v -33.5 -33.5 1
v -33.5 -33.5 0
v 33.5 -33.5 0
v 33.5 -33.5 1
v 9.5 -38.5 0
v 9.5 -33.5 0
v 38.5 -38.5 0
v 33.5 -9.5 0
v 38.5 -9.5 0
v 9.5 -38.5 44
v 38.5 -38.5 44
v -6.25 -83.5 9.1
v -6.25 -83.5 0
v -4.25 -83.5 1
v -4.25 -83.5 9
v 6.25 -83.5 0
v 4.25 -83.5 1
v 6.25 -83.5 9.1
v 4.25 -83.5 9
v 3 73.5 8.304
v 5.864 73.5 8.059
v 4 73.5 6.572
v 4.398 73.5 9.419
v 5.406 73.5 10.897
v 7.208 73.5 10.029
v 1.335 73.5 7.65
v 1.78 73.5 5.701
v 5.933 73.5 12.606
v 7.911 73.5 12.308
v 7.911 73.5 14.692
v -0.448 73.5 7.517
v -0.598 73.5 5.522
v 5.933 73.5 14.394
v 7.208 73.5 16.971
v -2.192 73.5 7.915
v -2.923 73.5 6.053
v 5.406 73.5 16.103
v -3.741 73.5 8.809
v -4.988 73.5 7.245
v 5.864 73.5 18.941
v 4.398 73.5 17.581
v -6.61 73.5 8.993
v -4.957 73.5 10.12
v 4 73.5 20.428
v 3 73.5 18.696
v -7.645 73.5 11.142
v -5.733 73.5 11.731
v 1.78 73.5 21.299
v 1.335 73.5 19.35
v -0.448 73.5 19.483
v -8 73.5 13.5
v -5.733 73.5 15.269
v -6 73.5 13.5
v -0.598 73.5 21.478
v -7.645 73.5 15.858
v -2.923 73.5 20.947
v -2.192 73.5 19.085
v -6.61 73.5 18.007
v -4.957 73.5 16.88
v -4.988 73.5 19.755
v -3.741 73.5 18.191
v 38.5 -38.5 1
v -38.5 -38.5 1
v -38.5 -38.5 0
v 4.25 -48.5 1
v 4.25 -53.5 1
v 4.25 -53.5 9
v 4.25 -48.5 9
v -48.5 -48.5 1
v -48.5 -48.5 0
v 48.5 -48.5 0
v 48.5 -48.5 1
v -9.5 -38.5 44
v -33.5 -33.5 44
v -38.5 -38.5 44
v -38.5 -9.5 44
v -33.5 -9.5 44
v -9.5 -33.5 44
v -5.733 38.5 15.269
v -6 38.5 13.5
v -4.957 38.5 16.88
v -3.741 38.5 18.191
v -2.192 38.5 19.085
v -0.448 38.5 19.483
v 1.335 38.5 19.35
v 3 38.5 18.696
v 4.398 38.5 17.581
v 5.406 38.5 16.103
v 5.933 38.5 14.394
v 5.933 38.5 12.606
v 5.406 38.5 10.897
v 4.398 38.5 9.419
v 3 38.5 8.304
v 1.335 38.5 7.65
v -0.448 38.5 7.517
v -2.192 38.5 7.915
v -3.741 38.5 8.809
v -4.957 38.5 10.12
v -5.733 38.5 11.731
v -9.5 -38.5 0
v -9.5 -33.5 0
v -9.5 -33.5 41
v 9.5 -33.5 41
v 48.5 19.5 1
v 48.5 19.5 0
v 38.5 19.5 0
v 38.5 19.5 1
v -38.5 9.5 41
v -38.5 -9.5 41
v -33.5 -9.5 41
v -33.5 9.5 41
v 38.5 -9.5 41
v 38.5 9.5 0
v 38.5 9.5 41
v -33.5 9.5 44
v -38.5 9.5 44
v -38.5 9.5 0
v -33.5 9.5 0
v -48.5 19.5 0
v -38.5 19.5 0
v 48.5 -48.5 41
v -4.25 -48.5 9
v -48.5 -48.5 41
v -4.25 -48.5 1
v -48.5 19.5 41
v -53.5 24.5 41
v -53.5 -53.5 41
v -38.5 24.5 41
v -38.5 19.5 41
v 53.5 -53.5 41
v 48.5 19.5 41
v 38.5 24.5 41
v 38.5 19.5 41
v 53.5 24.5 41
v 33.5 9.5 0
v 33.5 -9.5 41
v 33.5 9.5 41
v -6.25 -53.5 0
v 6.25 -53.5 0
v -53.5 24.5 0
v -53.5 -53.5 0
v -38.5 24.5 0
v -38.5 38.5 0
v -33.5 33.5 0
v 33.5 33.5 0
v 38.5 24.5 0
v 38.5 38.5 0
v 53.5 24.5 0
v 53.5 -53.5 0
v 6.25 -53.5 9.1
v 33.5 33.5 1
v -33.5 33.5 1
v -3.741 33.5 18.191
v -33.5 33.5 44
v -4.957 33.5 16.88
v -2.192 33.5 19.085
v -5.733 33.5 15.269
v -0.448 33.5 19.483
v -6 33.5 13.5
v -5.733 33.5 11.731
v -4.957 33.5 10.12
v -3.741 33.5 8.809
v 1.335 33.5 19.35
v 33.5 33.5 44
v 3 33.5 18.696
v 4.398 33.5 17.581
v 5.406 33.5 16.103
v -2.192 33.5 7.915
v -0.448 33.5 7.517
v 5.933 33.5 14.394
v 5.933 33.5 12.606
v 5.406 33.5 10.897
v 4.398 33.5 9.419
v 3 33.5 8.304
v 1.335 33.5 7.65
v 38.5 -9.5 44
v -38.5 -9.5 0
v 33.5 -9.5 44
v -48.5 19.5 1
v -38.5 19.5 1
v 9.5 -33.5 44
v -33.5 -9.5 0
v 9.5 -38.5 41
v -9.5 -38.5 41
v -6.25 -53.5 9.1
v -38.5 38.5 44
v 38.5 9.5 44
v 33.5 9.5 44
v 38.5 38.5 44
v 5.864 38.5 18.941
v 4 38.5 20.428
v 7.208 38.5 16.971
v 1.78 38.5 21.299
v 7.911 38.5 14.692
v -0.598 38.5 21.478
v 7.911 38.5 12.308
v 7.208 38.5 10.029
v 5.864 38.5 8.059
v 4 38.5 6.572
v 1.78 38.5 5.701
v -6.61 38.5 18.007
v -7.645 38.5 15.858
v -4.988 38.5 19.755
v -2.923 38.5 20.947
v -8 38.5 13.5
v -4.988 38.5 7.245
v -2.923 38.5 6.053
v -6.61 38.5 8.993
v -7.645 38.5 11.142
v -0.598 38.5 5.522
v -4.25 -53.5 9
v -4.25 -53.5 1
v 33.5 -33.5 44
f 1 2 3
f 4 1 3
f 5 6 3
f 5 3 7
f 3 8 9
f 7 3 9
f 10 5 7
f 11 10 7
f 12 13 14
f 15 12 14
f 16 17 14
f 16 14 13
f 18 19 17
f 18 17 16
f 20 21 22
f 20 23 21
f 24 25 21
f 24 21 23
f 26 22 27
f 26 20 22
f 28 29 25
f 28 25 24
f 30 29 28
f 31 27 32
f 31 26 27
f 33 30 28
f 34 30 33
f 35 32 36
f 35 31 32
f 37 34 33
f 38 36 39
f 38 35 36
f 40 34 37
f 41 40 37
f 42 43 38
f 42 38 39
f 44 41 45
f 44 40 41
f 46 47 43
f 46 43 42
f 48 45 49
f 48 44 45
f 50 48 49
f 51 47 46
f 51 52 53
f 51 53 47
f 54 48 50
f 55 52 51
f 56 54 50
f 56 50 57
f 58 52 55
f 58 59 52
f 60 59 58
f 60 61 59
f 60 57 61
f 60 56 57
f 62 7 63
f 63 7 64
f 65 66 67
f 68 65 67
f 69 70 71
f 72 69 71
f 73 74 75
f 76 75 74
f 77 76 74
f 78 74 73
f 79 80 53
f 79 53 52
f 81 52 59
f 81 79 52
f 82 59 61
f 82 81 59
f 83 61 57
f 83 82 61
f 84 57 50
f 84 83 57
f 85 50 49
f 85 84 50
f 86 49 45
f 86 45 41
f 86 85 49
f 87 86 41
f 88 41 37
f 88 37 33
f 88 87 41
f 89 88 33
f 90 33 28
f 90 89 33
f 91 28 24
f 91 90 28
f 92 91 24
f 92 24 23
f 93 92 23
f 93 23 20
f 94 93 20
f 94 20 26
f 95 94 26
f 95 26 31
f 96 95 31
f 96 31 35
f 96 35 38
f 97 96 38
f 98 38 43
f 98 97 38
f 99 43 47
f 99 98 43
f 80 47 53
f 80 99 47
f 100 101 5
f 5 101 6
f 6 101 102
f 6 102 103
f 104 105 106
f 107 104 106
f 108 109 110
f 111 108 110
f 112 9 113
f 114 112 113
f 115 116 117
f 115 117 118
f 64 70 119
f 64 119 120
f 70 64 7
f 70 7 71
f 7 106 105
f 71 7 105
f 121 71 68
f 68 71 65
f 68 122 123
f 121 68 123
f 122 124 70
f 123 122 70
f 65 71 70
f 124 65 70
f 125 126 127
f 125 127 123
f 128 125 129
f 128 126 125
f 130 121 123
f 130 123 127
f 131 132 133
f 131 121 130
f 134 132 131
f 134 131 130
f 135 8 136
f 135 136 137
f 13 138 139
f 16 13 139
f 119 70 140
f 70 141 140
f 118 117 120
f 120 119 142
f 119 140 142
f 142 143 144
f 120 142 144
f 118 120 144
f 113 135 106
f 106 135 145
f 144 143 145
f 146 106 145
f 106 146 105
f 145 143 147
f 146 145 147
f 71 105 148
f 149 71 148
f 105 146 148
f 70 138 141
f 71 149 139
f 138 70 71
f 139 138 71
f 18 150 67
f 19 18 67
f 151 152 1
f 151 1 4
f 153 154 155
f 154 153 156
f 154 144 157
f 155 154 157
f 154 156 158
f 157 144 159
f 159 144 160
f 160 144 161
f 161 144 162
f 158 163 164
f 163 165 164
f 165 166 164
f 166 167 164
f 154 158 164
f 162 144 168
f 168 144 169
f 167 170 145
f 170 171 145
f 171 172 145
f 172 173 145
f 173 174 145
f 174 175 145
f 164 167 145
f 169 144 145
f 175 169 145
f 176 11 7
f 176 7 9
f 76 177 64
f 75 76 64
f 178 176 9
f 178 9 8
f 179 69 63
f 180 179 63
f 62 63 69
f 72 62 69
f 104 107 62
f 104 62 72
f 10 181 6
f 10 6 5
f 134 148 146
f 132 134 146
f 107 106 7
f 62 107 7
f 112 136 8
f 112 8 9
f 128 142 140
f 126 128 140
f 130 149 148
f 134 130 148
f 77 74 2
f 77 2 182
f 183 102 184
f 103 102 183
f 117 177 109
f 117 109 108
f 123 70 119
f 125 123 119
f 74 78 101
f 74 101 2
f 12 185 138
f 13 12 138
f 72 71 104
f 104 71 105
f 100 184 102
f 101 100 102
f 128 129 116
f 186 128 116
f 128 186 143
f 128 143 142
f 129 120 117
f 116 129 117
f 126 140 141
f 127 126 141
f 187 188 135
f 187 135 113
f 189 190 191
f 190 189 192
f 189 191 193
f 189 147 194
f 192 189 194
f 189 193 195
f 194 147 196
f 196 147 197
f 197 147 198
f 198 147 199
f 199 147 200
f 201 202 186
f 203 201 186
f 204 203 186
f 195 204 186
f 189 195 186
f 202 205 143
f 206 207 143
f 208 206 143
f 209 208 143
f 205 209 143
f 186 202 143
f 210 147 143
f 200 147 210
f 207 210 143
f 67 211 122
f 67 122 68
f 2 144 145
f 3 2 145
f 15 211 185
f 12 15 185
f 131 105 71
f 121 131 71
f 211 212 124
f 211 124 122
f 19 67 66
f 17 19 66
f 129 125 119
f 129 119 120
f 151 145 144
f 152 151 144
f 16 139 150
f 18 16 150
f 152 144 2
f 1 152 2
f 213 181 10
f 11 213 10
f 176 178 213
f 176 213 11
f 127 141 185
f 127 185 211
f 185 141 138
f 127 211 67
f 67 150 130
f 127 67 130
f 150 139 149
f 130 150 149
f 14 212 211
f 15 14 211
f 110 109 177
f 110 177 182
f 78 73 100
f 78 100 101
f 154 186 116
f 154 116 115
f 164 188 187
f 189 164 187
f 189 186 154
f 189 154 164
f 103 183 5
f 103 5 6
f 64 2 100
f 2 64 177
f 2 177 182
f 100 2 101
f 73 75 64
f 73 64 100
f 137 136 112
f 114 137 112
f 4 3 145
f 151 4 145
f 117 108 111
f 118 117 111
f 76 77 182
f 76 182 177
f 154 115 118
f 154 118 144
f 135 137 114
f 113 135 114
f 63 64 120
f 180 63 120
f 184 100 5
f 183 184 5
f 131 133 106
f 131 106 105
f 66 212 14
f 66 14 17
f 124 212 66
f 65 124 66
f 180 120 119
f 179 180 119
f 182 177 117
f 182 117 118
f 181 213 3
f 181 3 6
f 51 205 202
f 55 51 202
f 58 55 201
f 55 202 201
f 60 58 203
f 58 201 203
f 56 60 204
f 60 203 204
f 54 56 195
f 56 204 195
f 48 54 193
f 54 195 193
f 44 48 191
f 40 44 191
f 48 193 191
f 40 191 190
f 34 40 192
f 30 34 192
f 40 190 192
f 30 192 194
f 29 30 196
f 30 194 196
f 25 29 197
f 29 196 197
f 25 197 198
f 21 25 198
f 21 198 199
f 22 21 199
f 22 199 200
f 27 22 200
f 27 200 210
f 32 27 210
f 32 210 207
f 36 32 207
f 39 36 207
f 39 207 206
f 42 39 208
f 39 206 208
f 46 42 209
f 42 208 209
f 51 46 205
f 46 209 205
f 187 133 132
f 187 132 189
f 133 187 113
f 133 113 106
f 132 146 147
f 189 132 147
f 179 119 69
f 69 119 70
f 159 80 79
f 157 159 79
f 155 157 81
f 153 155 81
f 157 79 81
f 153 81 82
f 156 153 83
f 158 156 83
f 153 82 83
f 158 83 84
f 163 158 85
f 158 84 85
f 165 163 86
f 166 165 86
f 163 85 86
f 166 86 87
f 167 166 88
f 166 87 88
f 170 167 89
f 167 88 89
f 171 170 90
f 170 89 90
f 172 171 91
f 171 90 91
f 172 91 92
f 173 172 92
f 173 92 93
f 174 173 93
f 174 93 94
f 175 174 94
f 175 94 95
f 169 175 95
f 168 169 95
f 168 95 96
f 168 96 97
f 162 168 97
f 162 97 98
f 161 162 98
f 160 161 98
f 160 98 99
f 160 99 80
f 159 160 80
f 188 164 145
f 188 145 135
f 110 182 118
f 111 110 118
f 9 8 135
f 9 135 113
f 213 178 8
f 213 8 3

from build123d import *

# Parameters (mm, degrees)
F1_DEPTH  = 44
F0_W      = 5
F0_H      = 19
F2_DEPTH  = 41
F0_W_2    = 19
F0_H_2    = 5
F0_W_3    = 8.5
F3_DEPTH  = 41
F4_DEPTH  = 1
F5_R      = 8
F5_R_2    = 6
F6_DEPTH  = 35
F7_DEPTH  = 25
F8_W      = 8.5
F8_H      = 1
F8_W_2    = 2
F9_DEPTH  = 30
F8_H_2    = 8
F10_DEPTH = 25


with BuildPart() as f1:
    # F0 (on Top) → F1 (new body)
    with BuildSketch(Plane.XY):
        Polygon((-33.5, 33.5), (33.5, 33.5), (33.5, 9.5), (38.5, 9.5), (38.5, 19.5), (38.5, 24.5), (38.5, 38.5), (6, 38.5), (-6, 38.5), (-38.5, 38.5), (-38.5, 24.5), (-38.5, 19.5), (-38.5, 9.5), (-33.5, 9.5), align=None)
    extrude(amount=F1_DEPTH)

    # F0 (on Top) → F3 (join)
    with BuildSketch(Plane.XY):
        Polygon((-48.5, 19.5), (-38.5, 19.5), (-38.5, 24.5), (-53.5, 24.5), (-53.5, 19.5), (-53.5, -53.5), (-4.25, -53.5), (-4.25, -48.5), (-48.5, -48.5), align=None)
        Polygon((38.5, 24.5), (38.5, 19.5), (48.5, 19.5), (48.5, -48.5), (4.25, -48.5), (4.25, -53.5), (53.5, -53.5), (53.5, 19.5), (53.5, 24.5), align=None)
        with Locations((0, -51)):
            Rectangle(F0_W_3, F0_H_2)
    extrude(amount=F3_DEPTH)

    # F5 (on face) → F6 (join)
    with BuildSketch(Plane(origin=(0, 38.5, 0), x_dir=(-1, 0, 0), z_dir=(0, 1, 0))):
        with Locations((0, 13.5)):
            Circle(F5_R)
        with Locations((0, 13.5)):
            Circle(F5_R_2, mode=Mode.SUBTRACT)
    extrude(amount=F6_DEPTH)

    # F7 (cut): a face of the model
    f7_faces = [f1.faces().sort_by_distance(p)[0] for p in [
        (0, 38.5, 13.5),
    ]]
    extrude(f7_faces, amount=-F7_DEPTH, mode=Mode.SUBTRACT)

    # F8 (on face) → F9 (join)
    with BuildSketch(Plane.XZ.offset(53.5)):
        with Locations((0, 0.5)):
            Rectangle(F8_W, F8_H)
        Polygon((4.25, 9), (4.25, 1), (6.25, 1), (6.25, 9.1), align=None)
        Polygon((-6.25, 1), (-4.25, 1), (-4.25, 9), (-6.25, 9.1), align=None)
        with Locations((5.25, 0.5)):
            Rectangle(F8_W_2, F8_H)
        with Locations((-5.25, 0.5)):
            Rectangle(F8_W_2, F8_H)
    extrude(amount=F9_DEPTH)

    # F8 (on face) → F10 (cut)
    with BuildSketch(Plane.XZ.offset(53.5)):
        with Locations((0, 5)):
            Rectangle(F8_W, F8_H_2)
    extrude(amount=-F10_DEPTH, mode=Mode.SUBTRACT)


with BuildPart() as f1b:
    # F0 (on Top) → F1, piece 2 (new body)
    with BuildSketch(Plane.XY):
        Polygon((-33.5, -33.5), (-33.5, -9.5), (-38.5, -9.5), (-38.5, -38.5), (-9.5, -38.5), (-9.5, -33.5), align=None)
    extrude(amount=F1_DEPTH)


with BuildPart() as f1c:
    # F0 (on Top) → F1, piece 3 (new body)
    with BuildSketch(Plane.XY):
        Polygon((38.5, -9.5), (33.5, -9.5), (33.5, -33.5), (9.5, -33.5), (9.5, -38.5), (38.5, -38.5), align=None)
    extrude(amount=F1_DEPTH)


with BuildPart() as f2:
    # F0 (on Top) → F2 (new body)
    with BuildSketch(Plane.XY):
        with Locations((-36, 0)):
            Rectangle(F0_W, F0_H)
    extrude(amount=F2_DEPTH)


with BuildPart() as f2b:
    # F0 (on Top) → F2, piece 2 (new body)
    with BuildSketch(Plane.XY):
        with Locations((36, 0)):
            Rectangle(F0_W, F0_H)
    extrude(amount=F2_DEPTH)


with BuildPart() as f2c:
    # F0 (on Top) → F2, piece 3 (new body)
    with BuildSketch(Plane.XY):
        with Locations((0, -36)):
            Rectangle(F0_W_2, F0_H_2)
    extrude(amount=F2_DEPTH)


with BuildPart() as f4:
    # F0 (on Top) → F4 (new body)
    with BuildSketch(Plane.XY):
        Polygon((33.5, 9.5), (33.5, 33.5), (-33.5, 33.5), (-33.5, 9.5), (-33.5, -9.5), (-33.5, -33.5), (-9.5, -33.5), (9.5, -33.5), (33.5, -33.5), (33.5, -9.5), align=None)
    extrude(amount=F4_DEPTH)


with BuildPart() as f4b:
    # F0 (on Top) → F4, piece 2 (new body)
    with BuildSketch(Plane.XY):
        Polygon((38.5, 19.5), (38.5, 9.5), (38.5, -9.5), (38.5, -38.5), (9.5, -38.5), (-9.5, -38.5), (-38.5, -38.5), (-38.5, -9.5), (-38.5, 9.5), (-38.5, 19.5), (-48.5, 19.5), (-48.5, -48.5), (-4.25, -48.5), (4.25, -48.5), (48.5, -48.5), (48.5, 19.5), align=None)
    extrude(amount=F4_DEPTH)


solid = Compound([f1.part, f1b.part, f1c.part, f2.part, f2b.part, f2c.part, f4.part, f4b.part])
